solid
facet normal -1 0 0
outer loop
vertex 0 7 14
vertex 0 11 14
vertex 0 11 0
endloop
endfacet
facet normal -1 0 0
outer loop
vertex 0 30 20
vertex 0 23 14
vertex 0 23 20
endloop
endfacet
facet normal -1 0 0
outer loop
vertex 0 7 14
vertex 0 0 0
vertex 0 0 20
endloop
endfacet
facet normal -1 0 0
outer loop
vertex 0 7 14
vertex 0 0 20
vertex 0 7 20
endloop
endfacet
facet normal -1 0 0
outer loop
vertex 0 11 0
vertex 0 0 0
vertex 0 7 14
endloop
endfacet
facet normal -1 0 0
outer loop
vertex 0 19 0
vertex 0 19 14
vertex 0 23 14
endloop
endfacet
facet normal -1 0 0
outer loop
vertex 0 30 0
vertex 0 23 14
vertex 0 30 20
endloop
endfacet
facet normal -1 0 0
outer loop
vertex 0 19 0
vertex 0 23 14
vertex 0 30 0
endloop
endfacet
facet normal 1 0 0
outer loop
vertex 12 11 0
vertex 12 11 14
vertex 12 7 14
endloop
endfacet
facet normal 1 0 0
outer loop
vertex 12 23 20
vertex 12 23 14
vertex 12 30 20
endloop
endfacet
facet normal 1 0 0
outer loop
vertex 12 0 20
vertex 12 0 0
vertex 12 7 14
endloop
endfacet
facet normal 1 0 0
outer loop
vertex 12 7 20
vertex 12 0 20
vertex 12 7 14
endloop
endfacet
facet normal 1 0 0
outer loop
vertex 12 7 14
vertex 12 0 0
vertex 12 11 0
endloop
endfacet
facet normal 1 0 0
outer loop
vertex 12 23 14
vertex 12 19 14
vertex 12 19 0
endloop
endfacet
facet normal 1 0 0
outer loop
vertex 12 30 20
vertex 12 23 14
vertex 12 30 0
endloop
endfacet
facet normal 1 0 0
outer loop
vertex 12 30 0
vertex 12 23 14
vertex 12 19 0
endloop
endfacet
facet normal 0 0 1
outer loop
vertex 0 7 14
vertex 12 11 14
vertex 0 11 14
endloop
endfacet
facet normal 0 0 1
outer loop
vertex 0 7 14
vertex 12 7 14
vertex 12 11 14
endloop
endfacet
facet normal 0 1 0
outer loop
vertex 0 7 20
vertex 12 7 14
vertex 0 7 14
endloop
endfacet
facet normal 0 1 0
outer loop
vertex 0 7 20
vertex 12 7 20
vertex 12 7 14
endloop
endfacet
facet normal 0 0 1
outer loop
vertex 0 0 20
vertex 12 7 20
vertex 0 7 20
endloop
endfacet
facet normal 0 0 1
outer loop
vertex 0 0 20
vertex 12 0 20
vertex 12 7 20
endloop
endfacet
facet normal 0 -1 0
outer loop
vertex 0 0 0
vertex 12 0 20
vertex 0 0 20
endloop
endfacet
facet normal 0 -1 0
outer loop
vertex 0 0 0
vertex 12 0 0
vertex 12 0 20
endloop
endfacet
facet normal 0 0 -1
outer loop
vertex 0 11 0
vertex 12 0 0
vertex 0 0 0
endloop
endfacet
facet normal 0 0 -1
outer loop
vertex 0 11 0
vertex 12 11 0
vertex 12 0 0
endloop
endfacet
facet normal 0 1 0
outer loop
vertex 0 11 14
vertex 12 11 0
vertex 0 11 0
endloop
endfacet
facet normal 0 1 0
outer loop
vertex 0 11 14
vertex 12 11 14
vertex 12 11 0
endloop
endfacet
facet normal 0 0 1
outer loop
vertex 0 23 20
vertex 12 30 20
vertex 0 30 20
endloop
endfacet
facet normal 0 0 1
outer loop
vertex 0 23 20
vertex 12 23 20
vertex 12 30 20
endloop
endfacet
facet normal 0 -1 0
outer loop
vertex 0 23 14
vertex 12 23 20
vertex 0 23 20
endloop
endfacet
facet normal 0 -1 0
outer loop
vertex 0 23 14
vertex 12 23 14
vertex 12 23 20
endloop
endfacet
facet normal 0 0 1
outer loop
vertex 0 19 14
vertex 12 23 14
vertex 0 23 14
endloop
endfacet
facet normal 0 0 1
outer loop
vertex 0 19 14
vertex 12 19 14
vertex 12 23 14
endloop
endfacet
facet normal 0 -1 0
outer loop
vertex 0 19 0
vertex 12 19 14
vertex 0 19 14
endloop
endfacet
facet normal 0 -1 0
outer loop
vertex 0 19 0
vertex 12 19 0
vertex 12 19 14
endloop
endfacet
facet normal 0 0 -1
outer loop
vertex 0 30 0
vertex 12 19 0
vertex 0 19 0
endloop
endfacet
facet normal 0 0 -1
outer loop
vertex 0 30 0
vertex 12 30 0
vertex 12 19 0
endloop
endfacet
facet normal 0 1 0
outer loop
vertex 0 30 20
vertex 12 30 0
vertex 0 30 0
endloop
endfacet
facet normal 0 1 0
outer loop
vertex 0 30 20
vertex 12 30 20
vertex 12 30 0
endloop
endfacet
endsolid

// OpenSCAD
// Counterbore: a stepped, flat-bottomed cylindrical recess (wide) over a
// narrower through-hole, for a bolt head to sit flush/recessed.
// Modeled as an extruded cross-section profile (viewed face-on from the
// renderer's "side" view) so the step is unambiguous — a solid CSG hole
// would be hidden inside an opaque block from any outside view.
w = 30; h = 20; thick = 12;
recess_r = 8; recess_d = 6;
hole_r = 4;

rotate([0, 0, 90])
rotate([90, 0, 0])
linear_extrude(height = thick)
difference() {
    square([w, h]);
    translate([w / 2 - hole_r, -1]) square([hole_r * 2, h + 2]);
    translate([w / 2 - recess_r, h - recess_d]) square([recess_r * 2, recess_d + 1]);
}
